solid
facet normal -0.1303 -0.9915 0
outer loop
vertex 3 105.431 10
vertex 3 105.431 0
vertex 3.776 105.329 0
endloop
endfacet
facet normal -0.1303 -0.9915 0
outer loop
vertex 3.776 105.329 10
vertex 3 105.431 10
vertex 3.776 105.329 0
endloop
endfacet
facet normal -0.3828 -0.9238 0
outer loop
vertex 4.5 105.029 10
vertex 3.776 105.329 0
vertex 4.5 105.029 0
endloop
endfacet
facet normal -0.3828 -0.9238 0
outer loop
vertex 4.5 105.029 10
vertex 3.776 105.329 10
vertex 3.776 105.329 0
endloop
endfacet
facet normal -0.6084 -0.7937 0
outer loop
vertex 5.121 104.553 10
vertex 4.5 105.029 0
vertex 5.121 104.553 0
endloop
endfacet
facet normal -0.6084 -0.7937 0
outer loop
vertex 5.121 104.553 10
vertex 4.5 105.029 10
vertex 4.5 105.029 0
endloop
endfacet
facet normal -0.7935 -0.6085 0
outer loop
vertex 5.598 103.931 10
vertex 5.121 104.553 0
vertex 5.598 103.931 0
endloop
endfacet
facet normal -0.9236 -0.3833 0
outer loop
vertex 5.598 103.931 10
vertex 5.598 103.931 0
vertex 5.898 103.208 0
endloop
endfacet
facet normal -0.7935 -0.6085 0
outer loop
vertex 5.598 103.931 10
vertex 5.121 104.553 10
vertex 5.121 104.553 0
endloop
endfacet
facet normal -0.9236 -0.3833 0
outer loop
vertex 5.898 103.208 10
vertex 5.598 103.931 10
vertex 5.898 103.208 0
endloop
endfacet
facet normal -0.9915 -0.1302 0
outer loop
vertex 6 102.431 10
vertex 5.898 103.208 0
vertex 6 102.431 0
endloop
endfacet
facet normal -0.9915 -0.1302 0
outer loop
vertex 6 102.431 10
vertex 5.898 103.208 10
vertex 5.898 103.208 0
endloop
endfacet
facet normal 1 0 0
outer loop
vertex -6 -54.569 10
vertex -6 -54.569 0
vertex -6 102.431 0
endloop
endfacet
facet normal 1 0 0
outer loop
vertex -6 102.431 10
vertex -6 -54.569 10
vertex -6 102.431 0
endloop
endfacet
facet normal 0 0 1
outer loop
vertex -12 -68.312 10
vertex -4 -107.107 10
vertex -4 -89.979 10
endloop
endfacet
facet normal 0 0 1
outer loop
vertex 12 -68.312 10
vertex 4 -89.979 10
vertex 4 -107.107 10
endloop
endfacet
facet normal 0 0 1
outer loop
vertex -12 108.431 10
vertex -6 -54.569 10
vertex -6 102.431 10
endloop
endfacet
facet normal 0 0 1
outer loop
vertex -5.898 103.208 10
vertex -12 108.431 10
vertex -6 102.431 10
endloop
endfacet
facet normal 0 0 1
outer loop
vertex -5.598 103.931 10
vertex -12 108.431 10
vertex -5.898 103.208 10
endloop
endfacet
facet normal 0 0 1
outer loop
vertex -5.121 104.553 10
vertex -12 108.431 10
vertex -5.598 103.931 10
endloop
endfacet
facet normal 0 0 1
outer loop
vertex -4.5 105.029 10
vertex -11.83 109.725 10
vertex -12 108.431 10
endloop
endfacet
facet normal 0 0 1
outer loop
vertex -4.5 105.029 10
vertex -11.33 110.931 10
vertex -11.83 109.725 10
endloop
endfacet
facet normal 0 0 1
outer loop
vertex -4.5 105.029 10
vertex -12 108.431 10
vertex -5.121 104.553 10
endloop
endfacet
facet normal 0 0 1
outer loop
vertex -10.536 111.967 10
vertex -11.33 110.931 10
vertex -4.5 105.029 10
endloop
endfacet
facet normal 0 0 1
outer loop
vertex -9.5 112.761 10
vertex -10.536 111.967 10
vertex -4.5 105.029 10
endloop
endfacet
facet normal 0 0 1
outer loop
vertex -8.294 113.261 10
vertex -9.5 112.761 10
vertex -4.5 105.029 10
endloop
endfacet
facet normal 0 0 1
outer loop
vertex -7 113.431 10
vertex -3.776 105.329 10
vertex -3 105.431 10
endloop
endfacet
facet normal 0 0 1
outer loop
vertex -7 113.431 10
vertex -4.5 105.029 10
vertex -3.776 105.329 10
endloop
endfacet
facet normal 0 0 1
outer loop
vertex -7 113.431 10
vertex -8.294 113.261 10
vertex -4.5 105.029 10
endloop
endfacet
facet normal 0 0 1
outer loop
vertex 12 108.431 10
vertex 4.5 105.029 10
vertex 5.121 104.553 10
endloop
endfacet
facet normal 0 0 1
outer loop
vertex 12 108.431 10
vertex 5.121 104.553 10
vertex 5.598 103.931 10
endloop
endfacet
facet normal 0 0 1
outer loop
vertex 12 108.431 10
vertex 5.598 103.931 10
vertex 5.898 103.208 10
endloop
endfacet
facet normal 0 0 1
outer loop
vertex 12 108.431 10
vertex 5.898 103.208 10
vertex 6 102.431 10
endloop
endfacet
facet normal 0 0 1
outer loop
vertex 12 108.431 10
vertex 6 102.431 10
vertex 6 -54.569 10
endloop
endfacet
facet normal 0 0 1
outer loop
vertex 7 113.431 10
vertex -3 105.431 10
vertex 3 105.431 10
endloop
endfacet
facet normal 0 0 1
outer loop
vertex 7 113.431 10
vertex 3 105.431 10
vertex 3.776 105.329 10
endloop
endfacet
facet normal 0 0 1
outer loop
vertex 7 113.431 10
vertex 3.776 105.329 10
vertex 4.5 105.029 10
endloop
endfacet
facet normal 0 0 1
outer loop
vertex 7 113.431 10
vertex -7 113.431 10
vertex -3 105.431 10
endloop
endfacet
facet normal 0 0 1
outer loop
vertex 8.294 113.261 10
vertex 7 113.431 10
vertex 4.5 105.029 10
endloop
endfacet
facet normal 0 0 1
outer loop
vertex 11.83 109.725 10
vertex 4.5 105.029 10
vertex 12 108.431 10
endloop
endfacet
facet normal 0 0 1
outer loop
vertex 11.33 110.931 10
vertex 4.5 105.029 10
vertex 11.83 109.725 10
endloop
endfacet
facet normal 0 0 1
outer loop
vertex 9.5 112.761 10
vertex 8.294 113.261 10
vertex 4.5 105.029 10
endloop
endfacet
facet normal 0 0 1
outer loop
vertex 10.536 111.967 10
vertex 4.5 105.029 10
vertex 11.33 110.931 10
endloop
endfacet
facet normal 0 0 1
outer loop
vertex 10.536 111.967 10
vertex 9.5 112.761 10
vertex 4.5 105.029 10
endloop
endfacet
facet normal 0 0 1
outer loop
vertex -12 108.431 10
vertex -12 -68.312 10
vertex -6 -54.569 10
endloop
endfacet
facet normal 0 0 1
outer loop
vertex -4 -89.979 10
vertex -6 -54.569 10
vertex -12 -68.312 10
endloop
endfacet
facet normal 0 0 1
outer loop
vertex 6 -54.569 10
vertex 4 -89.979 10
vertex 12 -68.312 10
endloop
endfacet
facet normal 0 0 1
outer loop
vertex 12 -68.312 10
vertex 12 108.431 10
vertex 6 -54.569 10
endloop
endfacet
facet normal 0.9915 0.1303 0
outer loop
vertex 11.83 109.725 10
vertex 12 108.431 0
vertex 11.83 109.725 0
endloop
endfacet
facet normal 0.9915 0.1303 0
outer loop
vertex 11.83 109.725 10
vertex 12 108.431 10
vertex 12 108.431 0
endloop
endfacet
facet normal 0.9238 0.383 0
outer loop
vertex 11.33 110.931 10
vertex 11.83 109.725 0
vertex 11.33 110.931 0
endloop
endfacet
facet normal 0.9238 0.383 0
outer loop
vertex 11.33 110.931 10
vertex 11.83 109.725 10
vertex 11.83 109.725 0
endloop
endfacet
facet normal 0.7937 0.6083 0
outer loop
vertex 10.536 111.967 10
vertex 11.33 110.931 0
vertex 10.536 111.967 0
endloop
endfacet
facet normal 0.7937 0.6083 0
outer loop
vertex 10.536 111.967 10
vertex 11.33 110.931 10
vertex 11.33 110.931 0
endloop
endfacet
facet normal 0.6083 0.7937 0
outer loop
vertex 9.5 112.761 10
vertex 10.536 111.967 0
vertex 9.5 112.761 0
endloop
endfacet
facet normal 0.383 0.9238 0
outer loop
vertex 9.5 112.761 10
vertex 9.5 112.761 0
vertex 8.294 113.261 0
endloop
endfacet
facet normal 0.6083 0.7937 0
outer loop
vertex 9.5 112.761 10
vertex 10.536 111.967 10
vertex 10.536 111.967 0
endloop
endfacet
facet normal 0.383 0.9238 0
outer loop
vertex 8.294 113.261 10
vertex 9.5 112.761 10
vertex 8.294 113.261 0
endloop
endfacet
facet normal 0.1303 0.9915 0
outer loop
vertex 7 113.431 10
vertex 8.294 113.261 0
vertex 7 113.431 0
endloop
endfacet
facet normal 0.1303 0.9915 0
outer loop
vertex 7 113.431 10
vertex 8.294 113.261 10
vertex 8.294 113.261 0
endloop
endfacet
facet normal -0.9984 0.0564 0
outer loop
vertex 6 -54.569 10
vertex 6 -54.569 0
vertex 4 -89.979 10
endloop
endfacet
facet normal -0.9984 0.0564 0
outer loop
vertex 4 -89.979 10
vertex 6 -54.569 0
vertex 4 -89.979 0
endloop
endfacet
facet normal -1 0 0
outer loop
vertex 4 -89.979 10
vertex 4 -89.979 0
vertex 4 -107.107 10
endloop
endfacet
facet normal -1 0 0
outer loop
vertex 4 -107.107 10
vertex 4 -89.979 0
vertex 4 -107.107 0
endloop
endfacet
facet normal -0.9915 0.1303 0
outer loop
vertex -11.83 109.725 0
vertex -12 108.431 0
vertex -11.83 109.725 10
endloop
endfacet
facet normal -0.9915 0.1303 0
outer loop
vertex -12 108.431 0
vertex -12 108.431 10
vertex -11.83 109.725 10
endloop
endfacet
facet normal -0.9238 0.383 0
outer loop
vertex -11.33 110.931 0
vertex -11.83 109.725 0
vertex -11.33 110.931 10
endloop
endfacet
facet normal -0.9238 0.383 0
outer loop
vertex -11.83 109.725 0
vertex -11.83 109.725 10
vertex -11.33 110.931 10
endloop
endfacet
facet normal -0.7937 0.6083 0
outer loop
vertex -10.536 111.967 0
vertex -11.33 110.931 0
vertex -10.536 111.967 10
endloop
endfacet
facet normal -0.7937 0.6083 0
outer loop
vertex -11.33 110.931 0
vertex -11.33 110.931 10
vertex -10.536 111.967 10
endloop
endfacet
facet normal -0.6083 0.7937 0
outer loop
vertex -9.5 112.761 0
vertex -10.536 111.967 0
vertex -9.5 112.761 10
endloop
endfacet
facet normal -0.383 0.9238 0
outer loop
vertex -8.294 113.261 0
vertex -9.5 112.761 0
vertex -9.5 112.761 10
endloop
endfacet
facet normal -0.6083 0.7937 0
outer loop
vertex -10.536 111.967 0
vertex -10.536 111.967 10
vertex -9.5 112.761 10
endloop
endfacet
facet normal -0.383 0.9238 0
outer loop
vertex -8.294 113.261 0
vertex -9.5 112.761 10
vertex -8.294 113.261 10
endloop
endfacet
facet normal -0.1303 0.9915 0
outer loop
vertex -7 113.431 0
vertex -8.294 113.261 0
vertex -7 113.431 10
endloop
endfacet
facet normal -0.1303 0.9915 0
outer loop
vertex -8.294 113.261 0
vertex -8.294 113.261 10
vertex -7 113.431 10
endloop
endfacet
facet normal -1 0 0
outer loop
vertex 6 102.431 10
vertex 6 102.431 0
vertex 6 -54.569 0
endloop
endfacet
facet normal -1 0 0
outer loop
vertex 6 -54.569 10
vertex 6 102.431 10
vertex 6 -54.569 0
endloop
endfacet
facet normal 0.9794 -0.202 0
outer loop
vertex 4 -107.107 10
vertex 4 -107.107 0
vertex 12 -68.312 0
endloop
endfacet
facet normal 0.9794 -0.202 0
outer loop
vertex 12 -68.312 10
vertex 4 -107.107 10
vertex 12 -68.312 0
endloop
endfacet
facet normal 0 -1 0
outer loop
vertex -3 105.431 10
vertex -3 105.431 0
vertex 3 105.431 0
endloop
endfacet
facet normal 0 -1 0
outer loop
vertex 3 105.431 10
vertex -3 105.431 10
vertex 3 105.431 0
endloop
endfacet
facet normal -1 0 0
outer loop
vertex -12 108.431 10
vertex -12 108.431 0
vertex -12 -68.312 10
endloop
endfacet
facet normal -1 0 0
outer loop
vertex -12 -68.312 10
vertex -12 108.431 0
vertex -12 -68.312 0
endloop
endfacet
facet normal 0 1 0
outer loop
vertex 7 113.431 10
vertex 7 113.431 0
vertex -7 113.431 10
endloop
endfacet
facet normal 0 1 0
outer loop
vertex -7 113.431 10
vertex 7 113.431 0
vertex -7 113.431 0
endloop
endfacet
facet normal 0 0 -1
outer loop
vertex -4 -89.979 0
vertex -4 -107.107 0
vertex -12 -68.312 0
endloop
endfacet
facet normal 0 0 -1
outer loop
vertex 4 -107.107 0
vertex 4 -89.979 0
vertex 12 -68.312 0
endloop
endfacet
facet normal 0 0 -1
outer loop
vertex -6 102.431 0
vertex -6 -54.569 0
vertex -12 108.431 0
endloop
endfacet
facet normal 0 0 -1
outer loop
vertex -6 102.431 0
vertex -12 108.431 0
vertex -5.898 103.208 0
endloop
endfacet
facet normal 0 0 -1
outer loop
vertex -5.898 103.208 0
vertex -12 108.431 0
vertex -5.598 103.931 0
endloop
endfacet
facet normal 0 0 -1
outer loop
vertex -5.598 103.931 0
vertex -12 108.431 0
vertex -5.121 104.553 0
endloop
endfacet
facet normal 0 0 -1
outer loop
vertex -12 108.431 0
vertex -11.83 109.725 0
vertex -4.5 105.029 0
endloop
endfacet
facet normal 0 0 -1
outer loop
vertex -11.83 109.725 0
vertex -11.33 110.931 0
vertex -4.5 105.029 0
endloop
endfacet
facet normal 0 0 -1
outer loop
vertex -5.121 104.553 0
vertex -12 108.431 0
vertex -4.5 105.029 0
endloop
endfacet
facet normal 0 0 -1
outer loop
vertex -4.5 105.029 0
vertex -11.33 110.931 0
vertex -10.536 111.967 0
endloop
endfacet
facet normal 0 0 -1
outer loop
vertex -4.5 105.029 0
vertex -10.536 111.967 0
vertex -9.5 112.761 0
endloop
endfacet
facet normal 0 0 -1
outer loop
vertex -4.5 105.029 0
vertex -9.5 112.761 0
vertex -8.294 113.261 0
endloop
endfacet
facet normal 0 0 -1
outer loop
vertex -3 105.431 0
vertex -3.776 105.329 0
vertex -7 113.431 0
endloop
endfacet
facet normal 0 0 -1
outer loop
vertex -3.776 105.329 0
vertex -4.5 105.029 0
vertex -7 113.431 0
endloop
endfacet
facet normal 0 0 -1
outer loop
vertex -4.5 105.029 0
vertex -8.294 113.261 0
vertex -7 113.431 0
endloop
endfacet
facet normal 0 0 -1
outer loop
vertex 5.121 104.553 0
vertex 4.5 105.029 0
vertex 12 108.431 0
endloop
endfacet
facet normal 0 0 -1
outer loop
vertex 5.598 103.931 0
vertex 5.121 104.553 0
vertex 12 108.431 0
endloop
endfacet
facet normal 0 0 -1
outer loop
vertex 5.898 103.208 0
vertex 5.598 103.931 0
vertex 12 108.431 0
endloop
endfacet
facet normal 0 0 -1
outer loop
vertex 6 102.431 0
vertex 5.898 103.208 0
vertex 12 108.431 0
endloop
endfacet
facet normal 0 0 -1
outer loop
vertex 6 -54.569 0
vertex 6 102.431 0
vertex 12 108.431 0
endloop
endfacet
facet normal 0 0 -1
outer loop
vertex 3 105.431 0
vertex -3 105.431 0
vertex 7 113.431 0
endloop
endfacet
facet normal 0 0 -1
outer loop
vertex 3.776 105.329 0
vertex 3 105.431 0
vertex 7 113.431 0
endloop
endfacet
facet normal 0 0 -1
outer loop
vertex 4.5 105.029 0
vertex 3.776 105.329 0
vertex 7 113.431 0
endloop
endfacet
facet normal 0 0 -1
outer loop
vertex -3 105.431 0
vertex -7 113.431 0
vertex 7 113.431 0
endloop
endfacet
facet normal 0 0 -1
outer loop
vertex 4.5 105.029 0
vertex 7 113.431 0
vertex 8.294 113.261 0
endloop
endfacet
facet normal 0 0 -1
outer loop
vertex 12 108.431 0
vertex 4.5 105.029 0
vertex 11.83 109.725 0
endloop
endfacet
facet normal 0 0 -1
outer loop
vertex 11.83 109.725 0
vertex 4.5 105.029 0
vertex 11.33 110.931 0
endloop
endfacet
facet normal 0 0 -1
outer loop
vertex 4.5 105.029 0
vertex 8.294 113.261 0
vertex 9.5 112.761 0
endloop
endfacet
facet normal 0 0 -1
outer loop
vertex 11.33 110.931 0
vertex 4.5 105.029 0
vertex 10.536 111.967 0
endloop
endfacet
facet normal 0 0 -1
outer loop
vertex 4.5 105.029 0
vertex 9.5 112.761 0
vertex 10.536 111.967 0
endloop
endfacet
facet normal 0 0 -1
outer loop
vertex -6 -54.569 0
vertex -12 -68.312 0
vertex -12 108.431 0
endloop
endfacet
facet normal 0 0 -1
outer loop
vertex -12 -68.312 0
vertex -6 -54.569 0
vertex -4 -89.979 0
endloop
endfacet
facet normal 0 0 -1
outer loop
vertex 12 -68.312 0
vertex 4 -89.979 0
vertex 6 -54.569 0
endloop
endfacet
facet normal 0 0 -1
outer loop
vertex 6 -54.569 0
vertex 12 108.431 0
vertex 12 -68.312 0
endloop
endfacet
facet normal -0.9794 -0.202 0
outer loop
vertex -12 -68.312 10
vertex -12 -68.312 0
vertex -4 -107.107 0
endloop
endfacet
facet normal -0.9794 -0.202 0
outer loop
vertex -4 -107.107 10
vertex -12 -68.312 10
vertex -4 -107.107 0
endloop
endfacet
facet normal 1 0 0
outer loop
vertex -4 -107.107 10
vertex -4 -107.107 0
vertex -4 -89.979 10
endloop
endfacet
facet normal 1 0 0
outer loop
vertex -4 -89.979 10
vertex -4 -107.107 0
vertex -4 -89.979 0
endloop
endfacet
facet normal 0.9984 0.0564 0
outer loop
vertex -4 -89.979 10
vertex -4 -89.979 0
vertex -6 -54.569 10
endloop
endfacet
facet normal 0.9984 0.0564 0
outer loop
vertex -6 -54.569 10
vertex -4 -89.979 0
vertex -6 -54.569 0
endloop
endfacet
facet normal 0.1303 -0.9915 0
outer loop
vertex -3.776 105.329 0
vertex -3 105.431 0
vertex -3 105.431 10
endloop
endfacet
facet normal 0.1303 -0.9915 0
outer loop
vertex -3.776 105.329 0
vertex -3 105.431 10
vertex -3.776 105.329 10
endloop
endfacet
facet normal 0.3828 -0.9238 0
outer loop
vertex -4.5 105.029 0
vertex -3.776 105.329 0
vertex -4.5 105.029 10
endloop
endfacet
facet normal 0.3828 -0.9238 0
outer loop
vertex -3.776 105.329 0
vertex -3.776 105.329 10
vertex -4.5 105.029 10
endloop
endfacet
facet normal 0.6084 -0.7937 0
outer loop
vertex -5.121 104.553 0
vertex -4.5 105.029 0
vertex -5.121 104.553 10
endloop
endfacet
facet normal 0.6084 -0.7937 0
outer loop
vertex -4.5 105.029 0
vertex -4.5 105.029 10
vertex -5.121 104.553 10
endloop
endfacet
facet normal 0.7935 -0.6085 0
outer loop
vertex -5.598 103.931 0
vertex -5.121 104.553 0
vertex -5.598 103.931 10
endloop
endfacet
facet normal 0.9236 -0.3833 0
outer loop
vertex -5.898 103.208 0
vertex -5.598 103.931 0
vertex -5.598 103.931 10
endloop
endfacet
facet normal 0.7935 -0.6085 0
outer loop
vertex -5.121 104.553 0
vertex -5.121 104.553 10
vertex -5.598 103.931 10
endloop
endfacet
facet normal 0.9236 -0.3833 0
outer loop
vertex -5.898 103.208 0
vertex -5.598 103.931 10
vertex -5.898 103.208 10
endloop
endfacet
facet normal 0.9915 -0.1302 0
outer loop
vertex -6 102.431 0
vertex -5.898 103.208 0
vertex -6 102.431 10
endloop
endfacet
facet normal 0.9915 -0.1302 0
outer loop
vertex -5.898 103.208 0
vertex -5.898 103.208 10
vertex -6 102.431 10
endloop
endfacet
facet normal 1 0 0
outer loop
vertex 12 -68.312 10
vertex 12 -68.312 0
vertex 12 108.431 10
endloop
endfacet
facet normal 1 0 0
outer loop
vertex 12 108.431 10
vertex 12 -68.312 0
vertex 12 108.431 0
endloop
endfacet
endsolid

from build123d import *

# Parameters (mm, degrees)
F1_DEPTH = 10
F2_R     = 3
F3_R     = 5


with BuildPart() as f1:
    # F0 (on Top) → F1 (new body)
    with BuildSketch(Plane.XY):
        Polygon((-6, 105.431184), (0, 105.431184), (6, 105.431184), (6, -54.568816), (4, -89.978623), (4, -107.107288), (12, -68.312444), (12, 113.431184), (0, 113.431184), (-12, 113.431184), (-12, -68.312444), (-4, -107.107288), (-4, -89.978623), (-6, -54.568816), align=None)
    extrude(amount=F1_DEPTH)

    # F2
    f2_edges = [f1.edges().sort_by_distance(p)[0] for p in [
        (6, 105.431184, 5),
        (-6, 105.431184, 5),
    ]]
    fillet(f2_edges, radius=F2_R)

    # F3
    f3_edges = [f1.edges().sort_by_distance(p)[0] for p in [
        (-12, 113.431184, 5),
        (12, 113.431184, 5),
    ]]
    fillet(f3_edges, radius=F3_R)


solid = f1.part
